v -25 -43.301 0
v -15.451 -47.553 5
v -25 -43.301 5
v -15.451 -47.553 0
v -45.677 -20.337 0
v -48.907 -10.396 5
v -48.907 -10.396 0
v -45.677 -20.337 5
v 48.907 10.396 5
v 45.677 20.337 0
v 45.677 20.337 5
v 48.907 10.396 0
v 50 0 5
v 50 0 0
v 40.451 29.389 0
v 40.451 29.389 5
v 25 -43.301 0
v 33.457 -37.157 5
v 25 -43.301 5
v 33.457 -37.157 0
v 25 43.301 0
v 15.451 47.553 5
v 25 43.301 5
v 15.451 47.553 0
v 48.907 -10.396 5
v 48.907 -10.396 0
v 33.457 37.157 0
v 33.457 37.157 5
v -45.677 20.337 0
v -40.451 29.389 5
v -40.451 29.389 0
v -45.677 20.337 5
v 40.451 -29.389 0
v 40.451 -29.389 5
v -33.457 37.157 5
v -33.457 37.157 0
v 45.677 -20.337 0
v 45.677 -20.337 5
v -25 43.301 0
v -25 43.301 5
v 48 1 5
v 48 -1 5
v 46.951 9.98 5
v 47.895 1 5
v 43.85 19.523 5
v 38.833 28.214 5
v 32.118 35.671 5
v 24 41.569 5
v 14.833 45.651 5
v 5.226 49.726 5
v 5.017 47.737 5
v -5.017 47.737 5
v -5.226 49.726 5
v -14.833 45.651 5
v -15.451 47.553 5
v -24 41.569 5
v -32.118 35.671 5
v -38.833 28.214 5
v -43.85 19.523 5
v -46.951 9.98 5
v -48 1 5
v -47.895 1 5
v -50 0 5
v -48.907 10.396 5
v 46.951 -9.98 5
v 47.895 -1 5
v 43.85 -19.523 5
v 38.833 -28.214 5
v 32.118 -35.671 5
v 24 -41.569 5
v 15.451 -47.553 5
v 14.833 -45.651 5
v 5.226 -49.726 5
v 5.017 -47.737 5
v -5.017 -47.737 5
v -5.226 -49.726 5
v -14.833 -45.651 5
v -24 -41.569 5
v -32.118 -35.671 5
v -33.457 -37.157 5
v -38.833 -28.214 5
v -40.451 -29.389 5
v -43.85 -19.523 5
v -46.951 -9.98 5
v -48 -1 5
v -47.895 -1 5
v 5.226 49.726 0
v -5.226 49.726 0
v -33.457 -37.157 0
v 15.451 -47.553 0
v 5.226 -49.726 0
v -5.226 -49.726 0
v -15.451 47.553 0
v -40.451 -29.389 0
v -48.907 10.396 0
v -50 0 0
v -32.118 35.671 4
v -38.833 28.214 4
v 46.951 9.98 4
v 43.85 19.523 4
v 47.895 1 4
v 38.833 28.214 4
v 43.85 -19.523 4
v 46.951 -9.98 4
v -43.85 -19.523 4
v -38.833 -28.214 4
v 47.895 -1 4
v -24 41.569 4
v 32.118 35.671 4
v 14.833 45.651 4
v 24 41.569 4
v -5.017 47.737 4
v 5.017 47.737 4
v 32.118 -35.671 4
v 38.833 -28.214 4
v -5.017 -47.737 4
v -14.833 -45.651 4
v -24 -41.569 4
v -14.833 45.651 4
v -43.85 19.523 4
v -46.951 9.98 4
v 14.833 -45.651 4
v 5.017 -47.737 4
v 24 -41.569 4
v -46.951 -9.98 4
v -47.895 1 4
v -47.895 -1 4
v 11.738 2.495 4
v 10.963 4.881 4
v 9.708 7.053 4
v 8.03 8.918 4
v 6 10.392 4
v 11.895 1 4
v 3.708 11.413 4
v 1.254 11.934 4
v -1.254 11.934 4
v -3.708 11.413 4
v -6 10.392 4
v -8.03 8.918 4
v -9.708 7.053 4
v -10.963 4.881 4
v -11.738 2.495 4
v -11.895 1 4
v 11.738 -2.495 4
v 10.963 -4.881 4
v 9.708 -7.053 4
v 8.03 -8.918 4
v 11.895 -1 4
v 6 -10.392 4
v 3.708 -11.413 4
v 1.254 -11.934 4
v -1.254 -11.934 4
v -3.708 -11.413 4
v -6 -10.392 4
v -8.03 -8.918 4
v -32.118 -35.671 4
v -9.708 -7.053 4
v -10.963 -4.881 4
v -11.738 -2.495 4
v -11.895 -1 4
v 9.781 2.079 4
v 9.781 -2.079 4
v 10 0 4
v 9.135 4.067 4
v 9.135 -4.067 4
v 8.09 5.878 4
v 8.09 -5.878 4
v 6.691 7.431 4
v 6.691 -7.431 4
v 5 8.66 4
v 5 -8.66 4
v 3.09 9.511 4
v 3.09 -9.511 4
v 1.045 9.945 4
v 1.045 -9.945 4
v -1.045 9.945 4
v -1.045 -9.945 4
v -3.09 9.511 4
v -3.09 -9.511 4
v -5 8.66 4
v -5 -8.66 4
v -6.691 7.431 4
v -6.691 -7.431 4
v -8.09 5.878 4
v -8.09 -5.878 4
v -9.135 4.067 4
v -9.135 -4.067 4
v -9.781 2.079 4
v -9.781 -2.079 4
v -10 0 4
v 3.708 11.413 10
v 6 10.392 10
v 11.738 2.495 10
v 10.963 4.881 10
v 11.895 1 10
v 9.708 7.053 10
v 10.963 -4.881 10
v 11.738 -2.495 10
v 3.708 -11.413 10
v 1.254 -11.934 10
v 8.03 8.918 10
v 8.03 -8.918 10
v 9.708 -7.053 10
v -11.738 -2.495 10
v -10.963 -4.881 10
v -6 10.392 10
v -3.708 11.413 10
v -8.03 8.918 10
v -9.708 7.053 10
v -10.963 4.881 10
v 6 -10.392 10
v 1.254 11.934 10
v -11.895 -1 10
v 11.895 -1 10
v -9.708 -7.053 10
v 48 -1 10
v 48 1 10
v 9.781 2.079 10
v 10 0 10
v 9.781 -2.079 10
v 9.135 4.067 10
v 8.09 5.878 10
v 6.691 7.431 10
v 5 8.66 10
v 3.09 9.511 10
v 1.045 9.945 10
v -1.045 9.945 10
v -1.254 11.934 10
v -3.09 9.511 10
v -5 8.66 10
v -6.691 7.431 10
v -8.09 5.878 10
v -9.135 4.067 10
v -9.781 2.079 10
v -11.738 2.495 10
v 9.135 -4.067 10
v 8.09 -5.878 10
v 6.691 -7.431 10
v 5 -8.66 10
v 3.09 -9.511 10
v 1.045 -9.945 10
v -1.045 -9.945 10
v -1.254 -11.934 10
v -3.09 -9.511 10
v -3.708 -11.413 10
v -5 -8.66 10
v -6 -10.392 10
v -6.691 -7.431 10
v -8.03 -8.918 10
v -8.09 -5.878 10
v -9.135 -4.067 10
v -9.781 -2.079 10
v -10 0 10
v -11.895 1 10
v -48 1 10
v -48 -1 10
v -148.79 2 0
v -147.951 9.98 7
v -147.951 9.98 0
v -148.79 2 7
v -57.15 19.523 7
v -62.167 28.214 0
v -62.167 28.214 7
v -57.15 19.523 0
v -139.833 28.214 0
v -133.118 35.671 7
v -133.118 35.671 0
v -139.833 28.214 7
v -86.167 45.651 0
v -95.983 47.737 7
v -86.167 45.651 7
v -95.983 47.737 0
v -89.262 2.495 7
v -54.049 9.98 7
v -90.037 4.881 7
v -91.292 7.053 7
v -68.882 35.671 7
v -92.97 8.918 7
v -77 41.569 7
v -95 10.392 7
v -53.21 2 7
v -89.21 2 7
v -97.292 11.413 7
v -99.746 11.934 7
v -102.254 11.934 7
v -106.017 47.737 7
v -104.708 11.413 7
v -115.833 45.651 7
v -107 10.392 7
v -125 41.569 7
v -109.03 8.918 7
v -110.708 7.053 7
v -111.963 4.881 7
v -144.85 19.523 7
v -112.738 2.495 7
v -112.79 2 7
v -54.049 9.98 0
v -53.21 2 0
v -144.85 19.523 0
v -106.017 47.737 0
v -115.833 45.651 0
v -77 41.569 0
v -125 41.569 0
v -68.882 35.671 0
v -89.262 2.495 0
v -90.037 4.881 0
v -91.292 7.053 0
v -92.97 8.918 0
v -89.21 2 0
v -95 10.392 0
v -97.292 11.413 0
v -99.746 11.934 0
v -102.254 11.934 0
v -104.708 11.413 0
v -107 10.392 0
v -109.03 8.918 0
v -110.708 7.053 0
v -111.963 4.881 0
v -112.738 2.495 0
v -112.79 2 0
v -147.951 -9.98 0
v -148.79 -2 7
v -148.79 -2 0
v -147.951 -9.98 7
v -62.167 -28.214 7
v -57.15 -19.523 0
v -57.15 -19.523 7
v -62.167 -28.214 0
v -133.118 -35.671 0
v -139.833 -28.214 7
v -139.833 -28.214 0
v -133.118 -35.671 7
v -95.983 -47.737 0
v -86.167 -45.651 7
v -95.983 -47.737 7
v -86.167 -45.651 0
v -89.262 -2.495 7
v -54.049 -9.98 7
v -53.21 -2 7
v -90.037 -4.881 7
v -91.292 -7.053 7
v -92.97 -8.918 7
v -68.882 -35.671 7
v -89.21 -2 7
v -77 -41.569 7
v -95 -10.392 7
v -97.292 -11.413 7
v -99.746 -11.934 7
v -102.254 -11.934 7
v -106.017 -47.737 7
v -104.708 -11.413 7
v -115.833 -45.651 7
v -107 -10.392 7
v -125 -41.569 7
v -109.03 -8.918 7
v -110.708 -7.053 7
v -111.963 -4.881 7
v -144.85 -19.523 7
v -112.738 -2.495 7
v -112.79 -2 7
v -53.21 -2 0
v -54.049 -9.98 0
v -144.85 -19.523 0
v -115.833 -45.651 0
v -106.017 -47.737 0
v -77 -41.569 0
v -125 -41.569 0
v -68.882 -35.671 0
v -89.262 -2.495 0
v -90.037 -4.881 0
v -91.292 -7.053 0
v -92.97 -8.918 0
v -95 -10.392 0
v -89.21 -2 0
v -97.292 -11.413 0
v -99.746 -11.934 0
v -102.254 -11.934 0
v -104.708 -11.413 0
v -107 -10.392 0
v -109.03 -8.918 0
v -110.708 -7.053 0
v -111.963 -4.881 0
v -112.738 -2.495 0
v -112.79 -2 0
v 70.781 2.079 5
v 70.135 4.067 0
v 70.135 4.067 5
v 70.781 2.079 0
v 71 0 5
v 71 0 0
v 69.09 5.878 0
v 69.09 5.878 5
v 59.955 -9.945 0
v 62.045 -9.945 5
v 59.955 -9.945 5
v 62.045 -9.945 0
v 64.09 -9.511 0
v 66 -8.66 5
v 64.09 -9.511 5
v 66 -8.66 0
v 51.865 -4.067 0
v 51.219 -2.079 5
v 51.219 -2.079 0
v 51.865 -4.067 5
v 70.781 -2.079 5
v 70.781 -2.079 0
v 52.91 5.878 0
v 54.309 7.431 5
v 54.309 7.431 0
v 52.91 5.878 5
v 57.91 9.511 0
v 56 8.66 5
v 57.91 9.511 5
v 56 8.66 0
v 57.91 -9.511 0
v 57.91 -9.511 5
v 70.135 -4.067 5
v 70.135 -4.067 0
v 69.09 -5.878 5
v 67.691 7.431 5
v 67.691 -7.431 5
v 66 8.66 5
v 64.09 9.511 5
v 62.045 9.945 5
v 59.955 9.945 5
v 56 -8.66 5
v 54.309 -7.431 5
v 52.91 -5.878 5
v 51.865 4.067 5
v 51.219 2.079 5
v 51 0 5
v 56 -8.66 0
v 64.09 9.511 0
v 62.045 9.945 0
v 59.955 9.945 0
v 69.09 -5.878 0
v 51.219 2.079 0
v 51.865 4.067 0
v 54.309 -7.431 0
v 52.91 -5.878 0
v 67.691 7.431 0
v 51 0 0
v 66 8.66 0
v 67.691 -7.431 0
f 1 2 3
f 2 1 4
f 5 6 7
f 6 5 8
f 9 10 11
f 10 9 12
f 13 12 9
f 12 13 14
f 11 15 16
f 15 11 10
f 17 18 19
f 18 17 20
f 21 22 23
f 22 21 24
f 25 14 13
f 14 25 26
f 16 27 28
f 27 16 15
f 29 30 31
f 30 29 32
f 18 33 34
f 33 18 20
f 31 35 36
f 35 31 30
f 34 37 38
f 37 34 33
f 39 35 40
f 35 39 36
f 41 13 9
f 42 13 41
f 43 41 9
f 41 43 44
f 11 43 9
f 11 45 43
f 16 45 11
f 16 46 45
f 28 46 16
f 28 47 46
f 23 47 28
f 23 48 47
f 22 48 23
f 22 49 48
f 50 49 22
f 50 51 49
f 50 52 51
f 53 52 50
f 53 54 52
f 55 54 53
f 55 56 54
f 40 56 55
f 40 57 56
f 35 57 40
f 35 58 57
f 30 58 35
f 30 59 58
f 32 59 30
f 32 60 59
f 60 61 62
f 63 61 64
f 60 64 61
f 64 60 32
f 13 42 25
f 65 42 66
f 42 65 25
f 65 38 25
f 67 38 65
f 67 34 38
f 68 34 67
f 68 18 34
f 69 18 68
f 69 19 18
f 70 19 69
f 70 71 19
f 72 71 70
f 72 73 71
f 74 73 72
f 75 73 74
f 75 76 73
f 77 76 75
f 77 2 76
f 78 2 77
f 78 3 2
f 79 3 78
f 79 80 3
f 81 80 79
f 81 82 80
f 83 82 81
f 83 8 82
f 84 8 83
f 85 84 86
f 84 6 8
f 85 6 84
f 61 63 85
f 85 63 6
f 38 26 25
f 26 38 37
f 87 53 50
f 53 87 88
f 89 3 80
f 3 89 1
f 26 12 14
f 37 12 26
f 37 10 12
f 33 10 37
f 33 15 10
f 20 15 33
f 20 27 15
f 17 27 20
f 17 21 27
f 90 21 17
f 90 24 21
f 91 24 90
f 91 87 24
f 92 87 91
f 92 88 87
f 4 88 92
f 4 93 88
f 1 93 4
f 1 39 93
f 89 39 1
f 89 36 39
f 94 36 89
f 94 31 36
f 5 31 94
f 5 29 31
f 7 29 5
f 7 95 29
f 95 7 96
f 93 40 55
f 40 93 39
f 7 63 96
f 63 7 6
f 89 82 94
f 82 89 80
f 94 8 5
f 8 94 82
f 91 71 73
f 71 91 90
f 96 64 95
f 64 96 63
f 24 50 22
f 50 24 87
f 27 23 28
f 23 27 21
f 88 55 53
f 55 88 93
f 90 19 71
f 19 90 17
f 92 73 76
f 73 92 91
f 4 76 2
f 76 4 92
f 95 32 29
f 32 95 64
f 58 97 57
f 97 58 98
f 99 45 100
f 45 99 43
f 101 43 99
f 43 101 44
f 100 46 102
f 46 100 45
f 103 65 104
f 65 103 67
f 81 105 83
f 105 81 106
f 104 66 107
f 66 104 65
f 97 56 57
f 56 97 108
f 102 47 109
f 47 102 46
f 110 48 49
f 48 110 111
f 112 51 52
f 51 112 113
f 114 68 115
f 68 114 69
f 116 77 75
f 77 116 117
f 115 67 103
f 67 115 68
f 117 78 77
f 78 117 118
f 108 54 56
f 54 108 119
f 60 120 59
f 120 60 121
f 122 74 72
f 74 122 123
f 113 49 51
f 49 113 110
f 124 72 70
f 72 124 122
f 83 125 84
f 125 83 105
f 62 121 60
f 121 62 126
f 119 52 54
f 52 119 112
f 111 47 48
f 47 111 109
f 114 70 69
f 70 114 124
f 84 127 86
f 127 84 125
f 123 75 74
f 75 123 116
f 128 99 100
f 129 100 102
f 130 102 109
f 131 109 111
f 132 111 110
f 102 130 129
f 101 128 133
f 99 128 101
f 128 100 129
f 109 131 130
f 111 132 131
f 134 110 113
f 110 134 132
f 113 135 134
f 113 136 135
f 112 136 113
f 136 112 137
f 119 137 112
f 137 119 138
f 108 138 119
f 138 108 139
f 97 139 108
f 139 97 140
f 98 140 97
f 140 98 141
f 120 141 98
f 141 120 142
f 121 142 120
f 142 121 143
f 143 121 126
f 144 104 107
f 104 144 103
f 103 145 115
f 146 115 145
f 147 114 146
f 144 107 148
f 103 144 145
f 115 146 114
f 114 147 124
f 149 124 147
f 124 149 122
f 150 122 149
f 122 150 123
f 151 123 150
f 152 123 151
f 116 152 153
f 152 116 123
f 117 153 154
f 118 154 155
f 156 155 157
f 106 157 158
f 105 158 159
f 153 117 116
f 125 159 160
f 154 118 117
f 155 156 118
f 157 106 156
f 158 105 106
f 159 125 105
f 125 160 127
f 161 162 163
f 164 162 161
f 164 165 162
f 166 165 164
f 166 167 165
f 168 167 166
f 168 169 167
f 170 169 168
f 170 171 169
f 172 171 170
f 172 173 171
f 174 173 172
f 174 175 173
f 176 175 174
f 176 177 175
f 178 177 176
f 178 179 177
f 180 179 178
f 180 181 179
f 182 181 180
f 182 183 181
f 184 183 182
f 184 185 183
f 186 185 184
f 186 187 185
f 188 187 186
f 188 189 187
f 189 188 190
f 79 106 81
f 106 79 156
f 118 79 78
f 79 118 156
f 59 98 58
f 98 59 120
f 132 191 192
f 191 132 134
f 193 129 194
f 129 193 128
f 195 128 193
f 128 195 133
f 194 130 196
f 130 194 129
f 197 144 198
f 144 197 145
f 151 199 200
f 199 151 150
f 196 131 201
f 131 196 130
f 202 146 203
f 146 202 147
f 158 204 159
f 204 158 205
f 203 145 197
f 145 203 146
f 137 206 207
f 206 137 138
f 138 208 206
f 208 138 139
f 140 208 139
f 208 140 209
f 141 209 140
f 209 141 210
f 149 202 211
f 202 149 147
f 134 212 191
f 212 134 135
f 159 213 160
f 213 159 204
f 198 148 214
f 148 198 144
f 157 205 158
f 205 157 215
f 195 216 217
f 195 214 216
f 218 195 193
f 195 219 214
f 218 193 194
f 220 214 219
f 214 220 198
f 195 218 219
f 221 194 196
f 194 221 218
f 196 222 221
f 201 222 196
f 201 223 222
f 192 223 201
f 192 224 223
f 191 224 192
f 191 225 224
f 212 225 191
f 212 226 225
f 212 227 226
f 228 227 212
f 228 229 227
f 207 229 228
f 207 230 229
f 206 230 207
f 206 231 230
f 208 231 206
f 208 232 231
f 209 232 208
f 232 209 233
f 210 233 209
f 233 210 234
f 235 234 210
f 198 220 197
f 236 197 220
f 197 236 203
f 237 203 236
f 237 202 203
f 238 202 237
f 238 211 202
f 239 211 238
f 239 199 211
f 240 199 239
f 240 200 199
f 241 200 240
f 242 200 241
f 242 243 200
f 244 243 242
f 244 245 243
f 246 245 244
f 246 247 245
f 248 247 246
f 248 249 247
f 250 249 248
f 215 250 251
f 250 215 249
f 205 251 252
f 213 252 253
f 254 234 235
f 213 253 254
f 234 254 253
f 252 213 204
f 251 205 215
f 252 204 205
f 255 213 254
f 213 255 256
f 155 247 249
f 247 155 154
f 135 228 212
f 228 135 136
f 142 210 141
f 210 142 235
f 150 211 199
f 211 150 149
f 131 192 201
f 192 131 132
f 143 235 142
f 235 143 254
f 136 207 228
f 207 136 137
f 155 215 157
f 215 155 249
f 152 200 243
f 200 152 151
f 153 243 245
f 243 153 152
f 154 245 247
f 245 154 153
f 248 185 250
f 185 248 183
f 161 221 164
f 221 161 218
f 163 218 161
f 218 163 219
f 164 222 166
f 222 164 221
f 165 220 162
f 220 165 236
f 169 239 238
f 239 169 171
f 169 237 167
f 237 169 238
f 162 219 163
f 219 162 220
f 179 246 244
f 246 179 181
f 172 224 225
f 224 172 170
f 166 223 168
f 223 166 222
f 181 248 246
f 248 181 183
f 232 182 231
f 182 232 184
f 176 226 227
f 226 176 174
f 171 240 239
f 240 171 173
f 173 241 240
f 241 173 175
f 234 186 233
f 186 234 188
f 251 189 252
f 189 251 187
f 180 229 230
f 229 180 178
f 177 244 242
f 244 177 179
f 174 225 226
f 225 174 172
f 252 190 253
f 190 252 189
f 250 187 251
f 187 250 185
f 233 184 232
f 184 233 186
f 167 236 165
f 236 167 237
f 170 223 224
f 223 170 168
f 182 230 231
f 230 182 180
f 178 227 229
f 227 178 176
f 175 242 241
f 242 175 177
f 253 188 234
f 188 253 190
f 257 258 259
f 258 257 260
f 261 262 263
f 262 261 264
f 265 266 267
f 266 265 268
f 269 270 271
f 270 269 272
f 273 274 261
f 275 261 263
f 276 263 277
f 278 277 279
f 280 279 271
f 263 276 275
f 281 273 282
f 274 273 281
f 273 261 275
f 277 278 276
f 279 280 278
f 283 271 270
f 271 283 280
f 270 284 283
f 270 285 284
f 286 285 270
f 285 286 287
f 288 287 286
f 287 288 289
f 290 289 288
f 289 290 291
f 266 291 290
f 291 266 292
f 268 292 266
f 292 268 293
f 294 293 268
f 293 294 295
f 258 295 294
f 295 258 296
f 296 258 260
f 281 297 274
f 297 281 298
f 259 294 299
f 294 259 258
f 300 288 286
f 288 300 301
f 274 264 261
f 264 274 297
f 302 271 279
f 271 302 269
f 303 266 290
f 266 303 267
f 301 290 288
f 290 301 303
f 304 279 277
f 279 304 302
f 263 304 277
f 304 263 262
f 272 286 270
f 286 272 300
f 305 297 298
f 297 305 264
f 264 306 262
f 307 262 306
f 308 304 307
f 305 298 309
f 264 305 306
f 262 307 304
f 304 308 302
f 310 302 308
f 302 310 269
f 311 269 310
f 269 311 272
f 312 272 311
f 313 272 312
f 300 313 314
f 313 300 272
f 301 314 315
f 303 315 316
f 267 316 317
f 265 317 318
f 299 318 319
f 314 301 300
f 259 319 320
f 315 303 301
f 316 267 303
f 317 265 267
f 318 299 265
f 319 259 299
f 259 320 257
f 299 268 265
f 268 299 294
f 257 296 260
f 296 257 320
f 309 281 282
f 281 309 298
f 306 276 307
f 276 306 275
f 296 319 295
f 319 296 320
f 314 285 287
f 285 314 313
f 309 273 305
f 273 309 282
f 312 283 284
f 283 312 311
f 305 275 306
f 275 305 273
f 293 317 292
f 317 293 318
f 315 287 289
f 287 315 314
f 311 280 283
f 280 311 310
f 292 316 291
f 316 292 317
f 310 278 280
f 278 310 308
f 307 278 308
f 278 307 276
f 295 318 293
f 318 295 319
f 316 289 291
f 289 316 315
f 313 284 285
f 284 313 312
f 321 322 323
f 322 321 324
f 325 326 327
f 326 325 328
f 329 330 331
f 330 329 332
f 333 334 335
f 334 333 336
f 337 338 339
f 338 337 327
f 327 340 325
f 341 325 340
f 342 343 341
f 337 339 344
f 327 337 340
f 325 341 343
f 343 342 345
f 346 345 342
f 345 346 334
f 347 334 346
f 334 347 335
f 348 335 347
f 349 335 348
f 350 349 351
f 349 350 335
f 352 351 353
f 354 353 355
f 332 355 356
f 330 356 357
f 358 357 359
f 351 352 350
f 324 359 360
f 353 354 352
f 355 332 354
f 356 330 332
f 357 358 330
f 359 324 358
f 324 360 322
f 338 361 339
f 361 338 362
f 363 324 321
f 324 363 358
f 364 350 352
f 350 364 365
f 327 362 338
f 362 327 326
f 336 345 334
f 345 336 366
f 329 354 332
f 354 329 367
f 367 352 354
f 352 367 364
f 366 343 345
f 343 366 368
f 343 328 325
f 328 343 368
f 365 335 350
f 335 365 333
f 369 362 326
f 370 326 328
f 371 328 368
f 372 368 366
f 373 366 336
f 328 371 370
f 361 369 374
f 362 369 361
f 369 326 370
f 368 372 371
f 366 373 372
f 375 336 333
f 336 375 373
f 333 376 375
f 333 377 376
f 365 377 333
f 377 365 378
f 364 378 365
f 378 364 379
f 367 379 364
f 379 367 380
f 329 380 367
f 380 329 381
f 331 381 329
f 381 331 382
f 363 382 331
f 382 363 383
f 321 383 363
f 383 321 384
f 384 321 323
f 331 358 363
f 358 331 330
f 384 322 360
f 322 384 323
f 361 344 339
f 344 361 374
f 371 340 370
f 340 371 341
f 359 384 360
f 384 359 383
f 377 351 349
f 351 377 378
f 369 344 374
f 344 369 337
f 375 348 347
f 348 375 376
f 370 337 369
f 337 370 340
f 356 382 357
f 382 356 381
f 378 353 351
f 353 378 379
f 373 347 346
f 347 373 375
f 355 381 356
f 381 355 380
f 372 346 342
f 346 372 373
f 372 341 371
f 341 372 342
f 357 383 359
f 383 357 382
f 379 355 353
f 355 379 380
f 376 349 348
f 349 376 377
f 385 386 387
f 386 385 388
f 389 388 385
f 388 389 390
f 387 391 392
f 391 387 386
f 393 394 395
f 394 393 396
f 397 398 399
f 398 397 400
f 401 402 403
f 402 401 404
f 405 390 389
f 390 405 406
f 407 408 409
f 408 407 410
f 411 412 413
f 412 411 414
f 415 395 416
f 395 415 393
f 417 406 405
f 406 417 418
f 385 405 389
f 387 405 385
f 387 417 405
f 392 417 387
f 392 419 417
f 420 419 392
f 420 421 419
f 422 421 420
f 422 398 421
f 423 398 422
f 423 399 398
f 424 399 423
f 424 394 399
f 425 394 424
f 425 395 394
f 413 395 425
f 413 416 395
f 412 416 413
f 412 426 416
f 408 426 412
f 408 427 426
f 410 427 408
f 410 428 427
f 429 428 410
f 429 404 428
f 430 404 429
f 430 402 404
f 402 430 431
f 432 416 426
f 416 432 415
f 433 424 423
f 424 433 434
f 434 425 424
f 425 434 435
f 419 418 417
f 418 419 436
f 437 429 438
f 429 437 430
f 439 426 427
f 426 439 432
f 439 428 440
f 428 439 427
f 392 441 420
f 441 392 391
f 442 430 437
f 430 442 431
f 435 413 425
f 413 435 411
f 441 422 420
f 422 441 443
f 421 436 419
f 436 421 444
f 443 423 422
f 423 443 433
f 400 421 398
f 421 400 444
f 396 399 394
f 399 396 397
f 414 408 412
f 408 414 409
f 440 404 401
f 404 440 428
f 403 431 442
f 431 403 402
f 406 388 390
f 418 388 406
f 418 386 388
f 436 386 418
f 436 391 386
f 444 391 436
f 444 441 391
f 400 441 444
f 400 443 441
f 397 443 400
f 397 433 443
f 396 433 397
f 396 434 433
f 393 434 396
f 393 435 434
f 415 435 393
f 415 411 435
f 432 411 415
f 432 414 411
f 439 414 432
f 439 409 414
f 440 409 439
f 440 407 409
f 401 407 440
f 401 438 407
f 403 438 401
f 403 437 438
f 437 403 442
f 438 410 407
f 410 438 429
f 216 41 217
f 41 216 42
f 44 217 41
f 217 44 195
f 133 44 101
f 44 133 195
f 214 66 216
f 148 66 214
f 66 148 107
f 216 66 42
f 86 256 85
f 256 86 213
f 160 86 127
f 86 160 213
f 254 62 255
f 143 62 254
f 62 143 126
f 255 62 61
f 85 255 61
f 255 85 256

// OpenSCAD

//base height
height = 5;
//base radius
radius = 50;
//base thickness
thickness = 2;
//base deep
deep = 2;

//small circle height
sheight = 5;
//small circle radius
sradius = 10;

//lines thickness
line_thickness = 2;

difference()
{
    cylinder(height, radius, radius, false);
    translate([0, 0, height])
    cylinder(deep, radius - thickness, radius - thickness, true);
}

//small circle
difference()
{
   cylinder(sheight + height, 
            sradius + thickness, 
            sradius + thickness, false);
    cylinder(sheight + height, 
            sradius, sradius, false);
}

translate([radius + sradius + 1, 0, 0]) cylinder(sheight, sradius, sradius, false);

//lines
//difference(){
    translate([(sradius + thickness/2), -thickness/2, 0]) cube([radius-sradius-1.5*thickness,line_thickness,sheight + height],false);
    
  //  translate([(radius - thickness), -thickness/2, height]) rotate([-90,0,0]) { cylinder(5, 5, 5, false);}
//}

mirror([1, 0, 0]) 
translate([(sradius + thickness/2), -thickness/2, 0]) cube([radius-sradius-1.5*thickness,line_thickness,sheight + height],false);


//red part
translate([-(2*radius + 1), 0, 0])
difference()
{
    cylinder(sheight+deep, radius - thickness, radius - thickness, false);
    translate([0, -(radius - thickness)+line_thickness, 0])
    cube(2*(radius - thickness), center=true); 
    cylinder(sheight + deep, 
            sradius + thickness, 
            sradius + thickness, false);
}

//white part
translate([-(2*radius + 1), 0, 0])
mirror([0, -(2*radius + 1), 0]) 
difference()
{
    cylinder(sheight+deep, radius - thickness, radius - thickness, false);
    translate([0, -(radius - thickness)+line_thickness, 0])
    cube(2*(radius - thickness), center=true); 
    cylinder(sheight + deep, 
            sradius + thickness, 
            sradius + thickness, false);
}



